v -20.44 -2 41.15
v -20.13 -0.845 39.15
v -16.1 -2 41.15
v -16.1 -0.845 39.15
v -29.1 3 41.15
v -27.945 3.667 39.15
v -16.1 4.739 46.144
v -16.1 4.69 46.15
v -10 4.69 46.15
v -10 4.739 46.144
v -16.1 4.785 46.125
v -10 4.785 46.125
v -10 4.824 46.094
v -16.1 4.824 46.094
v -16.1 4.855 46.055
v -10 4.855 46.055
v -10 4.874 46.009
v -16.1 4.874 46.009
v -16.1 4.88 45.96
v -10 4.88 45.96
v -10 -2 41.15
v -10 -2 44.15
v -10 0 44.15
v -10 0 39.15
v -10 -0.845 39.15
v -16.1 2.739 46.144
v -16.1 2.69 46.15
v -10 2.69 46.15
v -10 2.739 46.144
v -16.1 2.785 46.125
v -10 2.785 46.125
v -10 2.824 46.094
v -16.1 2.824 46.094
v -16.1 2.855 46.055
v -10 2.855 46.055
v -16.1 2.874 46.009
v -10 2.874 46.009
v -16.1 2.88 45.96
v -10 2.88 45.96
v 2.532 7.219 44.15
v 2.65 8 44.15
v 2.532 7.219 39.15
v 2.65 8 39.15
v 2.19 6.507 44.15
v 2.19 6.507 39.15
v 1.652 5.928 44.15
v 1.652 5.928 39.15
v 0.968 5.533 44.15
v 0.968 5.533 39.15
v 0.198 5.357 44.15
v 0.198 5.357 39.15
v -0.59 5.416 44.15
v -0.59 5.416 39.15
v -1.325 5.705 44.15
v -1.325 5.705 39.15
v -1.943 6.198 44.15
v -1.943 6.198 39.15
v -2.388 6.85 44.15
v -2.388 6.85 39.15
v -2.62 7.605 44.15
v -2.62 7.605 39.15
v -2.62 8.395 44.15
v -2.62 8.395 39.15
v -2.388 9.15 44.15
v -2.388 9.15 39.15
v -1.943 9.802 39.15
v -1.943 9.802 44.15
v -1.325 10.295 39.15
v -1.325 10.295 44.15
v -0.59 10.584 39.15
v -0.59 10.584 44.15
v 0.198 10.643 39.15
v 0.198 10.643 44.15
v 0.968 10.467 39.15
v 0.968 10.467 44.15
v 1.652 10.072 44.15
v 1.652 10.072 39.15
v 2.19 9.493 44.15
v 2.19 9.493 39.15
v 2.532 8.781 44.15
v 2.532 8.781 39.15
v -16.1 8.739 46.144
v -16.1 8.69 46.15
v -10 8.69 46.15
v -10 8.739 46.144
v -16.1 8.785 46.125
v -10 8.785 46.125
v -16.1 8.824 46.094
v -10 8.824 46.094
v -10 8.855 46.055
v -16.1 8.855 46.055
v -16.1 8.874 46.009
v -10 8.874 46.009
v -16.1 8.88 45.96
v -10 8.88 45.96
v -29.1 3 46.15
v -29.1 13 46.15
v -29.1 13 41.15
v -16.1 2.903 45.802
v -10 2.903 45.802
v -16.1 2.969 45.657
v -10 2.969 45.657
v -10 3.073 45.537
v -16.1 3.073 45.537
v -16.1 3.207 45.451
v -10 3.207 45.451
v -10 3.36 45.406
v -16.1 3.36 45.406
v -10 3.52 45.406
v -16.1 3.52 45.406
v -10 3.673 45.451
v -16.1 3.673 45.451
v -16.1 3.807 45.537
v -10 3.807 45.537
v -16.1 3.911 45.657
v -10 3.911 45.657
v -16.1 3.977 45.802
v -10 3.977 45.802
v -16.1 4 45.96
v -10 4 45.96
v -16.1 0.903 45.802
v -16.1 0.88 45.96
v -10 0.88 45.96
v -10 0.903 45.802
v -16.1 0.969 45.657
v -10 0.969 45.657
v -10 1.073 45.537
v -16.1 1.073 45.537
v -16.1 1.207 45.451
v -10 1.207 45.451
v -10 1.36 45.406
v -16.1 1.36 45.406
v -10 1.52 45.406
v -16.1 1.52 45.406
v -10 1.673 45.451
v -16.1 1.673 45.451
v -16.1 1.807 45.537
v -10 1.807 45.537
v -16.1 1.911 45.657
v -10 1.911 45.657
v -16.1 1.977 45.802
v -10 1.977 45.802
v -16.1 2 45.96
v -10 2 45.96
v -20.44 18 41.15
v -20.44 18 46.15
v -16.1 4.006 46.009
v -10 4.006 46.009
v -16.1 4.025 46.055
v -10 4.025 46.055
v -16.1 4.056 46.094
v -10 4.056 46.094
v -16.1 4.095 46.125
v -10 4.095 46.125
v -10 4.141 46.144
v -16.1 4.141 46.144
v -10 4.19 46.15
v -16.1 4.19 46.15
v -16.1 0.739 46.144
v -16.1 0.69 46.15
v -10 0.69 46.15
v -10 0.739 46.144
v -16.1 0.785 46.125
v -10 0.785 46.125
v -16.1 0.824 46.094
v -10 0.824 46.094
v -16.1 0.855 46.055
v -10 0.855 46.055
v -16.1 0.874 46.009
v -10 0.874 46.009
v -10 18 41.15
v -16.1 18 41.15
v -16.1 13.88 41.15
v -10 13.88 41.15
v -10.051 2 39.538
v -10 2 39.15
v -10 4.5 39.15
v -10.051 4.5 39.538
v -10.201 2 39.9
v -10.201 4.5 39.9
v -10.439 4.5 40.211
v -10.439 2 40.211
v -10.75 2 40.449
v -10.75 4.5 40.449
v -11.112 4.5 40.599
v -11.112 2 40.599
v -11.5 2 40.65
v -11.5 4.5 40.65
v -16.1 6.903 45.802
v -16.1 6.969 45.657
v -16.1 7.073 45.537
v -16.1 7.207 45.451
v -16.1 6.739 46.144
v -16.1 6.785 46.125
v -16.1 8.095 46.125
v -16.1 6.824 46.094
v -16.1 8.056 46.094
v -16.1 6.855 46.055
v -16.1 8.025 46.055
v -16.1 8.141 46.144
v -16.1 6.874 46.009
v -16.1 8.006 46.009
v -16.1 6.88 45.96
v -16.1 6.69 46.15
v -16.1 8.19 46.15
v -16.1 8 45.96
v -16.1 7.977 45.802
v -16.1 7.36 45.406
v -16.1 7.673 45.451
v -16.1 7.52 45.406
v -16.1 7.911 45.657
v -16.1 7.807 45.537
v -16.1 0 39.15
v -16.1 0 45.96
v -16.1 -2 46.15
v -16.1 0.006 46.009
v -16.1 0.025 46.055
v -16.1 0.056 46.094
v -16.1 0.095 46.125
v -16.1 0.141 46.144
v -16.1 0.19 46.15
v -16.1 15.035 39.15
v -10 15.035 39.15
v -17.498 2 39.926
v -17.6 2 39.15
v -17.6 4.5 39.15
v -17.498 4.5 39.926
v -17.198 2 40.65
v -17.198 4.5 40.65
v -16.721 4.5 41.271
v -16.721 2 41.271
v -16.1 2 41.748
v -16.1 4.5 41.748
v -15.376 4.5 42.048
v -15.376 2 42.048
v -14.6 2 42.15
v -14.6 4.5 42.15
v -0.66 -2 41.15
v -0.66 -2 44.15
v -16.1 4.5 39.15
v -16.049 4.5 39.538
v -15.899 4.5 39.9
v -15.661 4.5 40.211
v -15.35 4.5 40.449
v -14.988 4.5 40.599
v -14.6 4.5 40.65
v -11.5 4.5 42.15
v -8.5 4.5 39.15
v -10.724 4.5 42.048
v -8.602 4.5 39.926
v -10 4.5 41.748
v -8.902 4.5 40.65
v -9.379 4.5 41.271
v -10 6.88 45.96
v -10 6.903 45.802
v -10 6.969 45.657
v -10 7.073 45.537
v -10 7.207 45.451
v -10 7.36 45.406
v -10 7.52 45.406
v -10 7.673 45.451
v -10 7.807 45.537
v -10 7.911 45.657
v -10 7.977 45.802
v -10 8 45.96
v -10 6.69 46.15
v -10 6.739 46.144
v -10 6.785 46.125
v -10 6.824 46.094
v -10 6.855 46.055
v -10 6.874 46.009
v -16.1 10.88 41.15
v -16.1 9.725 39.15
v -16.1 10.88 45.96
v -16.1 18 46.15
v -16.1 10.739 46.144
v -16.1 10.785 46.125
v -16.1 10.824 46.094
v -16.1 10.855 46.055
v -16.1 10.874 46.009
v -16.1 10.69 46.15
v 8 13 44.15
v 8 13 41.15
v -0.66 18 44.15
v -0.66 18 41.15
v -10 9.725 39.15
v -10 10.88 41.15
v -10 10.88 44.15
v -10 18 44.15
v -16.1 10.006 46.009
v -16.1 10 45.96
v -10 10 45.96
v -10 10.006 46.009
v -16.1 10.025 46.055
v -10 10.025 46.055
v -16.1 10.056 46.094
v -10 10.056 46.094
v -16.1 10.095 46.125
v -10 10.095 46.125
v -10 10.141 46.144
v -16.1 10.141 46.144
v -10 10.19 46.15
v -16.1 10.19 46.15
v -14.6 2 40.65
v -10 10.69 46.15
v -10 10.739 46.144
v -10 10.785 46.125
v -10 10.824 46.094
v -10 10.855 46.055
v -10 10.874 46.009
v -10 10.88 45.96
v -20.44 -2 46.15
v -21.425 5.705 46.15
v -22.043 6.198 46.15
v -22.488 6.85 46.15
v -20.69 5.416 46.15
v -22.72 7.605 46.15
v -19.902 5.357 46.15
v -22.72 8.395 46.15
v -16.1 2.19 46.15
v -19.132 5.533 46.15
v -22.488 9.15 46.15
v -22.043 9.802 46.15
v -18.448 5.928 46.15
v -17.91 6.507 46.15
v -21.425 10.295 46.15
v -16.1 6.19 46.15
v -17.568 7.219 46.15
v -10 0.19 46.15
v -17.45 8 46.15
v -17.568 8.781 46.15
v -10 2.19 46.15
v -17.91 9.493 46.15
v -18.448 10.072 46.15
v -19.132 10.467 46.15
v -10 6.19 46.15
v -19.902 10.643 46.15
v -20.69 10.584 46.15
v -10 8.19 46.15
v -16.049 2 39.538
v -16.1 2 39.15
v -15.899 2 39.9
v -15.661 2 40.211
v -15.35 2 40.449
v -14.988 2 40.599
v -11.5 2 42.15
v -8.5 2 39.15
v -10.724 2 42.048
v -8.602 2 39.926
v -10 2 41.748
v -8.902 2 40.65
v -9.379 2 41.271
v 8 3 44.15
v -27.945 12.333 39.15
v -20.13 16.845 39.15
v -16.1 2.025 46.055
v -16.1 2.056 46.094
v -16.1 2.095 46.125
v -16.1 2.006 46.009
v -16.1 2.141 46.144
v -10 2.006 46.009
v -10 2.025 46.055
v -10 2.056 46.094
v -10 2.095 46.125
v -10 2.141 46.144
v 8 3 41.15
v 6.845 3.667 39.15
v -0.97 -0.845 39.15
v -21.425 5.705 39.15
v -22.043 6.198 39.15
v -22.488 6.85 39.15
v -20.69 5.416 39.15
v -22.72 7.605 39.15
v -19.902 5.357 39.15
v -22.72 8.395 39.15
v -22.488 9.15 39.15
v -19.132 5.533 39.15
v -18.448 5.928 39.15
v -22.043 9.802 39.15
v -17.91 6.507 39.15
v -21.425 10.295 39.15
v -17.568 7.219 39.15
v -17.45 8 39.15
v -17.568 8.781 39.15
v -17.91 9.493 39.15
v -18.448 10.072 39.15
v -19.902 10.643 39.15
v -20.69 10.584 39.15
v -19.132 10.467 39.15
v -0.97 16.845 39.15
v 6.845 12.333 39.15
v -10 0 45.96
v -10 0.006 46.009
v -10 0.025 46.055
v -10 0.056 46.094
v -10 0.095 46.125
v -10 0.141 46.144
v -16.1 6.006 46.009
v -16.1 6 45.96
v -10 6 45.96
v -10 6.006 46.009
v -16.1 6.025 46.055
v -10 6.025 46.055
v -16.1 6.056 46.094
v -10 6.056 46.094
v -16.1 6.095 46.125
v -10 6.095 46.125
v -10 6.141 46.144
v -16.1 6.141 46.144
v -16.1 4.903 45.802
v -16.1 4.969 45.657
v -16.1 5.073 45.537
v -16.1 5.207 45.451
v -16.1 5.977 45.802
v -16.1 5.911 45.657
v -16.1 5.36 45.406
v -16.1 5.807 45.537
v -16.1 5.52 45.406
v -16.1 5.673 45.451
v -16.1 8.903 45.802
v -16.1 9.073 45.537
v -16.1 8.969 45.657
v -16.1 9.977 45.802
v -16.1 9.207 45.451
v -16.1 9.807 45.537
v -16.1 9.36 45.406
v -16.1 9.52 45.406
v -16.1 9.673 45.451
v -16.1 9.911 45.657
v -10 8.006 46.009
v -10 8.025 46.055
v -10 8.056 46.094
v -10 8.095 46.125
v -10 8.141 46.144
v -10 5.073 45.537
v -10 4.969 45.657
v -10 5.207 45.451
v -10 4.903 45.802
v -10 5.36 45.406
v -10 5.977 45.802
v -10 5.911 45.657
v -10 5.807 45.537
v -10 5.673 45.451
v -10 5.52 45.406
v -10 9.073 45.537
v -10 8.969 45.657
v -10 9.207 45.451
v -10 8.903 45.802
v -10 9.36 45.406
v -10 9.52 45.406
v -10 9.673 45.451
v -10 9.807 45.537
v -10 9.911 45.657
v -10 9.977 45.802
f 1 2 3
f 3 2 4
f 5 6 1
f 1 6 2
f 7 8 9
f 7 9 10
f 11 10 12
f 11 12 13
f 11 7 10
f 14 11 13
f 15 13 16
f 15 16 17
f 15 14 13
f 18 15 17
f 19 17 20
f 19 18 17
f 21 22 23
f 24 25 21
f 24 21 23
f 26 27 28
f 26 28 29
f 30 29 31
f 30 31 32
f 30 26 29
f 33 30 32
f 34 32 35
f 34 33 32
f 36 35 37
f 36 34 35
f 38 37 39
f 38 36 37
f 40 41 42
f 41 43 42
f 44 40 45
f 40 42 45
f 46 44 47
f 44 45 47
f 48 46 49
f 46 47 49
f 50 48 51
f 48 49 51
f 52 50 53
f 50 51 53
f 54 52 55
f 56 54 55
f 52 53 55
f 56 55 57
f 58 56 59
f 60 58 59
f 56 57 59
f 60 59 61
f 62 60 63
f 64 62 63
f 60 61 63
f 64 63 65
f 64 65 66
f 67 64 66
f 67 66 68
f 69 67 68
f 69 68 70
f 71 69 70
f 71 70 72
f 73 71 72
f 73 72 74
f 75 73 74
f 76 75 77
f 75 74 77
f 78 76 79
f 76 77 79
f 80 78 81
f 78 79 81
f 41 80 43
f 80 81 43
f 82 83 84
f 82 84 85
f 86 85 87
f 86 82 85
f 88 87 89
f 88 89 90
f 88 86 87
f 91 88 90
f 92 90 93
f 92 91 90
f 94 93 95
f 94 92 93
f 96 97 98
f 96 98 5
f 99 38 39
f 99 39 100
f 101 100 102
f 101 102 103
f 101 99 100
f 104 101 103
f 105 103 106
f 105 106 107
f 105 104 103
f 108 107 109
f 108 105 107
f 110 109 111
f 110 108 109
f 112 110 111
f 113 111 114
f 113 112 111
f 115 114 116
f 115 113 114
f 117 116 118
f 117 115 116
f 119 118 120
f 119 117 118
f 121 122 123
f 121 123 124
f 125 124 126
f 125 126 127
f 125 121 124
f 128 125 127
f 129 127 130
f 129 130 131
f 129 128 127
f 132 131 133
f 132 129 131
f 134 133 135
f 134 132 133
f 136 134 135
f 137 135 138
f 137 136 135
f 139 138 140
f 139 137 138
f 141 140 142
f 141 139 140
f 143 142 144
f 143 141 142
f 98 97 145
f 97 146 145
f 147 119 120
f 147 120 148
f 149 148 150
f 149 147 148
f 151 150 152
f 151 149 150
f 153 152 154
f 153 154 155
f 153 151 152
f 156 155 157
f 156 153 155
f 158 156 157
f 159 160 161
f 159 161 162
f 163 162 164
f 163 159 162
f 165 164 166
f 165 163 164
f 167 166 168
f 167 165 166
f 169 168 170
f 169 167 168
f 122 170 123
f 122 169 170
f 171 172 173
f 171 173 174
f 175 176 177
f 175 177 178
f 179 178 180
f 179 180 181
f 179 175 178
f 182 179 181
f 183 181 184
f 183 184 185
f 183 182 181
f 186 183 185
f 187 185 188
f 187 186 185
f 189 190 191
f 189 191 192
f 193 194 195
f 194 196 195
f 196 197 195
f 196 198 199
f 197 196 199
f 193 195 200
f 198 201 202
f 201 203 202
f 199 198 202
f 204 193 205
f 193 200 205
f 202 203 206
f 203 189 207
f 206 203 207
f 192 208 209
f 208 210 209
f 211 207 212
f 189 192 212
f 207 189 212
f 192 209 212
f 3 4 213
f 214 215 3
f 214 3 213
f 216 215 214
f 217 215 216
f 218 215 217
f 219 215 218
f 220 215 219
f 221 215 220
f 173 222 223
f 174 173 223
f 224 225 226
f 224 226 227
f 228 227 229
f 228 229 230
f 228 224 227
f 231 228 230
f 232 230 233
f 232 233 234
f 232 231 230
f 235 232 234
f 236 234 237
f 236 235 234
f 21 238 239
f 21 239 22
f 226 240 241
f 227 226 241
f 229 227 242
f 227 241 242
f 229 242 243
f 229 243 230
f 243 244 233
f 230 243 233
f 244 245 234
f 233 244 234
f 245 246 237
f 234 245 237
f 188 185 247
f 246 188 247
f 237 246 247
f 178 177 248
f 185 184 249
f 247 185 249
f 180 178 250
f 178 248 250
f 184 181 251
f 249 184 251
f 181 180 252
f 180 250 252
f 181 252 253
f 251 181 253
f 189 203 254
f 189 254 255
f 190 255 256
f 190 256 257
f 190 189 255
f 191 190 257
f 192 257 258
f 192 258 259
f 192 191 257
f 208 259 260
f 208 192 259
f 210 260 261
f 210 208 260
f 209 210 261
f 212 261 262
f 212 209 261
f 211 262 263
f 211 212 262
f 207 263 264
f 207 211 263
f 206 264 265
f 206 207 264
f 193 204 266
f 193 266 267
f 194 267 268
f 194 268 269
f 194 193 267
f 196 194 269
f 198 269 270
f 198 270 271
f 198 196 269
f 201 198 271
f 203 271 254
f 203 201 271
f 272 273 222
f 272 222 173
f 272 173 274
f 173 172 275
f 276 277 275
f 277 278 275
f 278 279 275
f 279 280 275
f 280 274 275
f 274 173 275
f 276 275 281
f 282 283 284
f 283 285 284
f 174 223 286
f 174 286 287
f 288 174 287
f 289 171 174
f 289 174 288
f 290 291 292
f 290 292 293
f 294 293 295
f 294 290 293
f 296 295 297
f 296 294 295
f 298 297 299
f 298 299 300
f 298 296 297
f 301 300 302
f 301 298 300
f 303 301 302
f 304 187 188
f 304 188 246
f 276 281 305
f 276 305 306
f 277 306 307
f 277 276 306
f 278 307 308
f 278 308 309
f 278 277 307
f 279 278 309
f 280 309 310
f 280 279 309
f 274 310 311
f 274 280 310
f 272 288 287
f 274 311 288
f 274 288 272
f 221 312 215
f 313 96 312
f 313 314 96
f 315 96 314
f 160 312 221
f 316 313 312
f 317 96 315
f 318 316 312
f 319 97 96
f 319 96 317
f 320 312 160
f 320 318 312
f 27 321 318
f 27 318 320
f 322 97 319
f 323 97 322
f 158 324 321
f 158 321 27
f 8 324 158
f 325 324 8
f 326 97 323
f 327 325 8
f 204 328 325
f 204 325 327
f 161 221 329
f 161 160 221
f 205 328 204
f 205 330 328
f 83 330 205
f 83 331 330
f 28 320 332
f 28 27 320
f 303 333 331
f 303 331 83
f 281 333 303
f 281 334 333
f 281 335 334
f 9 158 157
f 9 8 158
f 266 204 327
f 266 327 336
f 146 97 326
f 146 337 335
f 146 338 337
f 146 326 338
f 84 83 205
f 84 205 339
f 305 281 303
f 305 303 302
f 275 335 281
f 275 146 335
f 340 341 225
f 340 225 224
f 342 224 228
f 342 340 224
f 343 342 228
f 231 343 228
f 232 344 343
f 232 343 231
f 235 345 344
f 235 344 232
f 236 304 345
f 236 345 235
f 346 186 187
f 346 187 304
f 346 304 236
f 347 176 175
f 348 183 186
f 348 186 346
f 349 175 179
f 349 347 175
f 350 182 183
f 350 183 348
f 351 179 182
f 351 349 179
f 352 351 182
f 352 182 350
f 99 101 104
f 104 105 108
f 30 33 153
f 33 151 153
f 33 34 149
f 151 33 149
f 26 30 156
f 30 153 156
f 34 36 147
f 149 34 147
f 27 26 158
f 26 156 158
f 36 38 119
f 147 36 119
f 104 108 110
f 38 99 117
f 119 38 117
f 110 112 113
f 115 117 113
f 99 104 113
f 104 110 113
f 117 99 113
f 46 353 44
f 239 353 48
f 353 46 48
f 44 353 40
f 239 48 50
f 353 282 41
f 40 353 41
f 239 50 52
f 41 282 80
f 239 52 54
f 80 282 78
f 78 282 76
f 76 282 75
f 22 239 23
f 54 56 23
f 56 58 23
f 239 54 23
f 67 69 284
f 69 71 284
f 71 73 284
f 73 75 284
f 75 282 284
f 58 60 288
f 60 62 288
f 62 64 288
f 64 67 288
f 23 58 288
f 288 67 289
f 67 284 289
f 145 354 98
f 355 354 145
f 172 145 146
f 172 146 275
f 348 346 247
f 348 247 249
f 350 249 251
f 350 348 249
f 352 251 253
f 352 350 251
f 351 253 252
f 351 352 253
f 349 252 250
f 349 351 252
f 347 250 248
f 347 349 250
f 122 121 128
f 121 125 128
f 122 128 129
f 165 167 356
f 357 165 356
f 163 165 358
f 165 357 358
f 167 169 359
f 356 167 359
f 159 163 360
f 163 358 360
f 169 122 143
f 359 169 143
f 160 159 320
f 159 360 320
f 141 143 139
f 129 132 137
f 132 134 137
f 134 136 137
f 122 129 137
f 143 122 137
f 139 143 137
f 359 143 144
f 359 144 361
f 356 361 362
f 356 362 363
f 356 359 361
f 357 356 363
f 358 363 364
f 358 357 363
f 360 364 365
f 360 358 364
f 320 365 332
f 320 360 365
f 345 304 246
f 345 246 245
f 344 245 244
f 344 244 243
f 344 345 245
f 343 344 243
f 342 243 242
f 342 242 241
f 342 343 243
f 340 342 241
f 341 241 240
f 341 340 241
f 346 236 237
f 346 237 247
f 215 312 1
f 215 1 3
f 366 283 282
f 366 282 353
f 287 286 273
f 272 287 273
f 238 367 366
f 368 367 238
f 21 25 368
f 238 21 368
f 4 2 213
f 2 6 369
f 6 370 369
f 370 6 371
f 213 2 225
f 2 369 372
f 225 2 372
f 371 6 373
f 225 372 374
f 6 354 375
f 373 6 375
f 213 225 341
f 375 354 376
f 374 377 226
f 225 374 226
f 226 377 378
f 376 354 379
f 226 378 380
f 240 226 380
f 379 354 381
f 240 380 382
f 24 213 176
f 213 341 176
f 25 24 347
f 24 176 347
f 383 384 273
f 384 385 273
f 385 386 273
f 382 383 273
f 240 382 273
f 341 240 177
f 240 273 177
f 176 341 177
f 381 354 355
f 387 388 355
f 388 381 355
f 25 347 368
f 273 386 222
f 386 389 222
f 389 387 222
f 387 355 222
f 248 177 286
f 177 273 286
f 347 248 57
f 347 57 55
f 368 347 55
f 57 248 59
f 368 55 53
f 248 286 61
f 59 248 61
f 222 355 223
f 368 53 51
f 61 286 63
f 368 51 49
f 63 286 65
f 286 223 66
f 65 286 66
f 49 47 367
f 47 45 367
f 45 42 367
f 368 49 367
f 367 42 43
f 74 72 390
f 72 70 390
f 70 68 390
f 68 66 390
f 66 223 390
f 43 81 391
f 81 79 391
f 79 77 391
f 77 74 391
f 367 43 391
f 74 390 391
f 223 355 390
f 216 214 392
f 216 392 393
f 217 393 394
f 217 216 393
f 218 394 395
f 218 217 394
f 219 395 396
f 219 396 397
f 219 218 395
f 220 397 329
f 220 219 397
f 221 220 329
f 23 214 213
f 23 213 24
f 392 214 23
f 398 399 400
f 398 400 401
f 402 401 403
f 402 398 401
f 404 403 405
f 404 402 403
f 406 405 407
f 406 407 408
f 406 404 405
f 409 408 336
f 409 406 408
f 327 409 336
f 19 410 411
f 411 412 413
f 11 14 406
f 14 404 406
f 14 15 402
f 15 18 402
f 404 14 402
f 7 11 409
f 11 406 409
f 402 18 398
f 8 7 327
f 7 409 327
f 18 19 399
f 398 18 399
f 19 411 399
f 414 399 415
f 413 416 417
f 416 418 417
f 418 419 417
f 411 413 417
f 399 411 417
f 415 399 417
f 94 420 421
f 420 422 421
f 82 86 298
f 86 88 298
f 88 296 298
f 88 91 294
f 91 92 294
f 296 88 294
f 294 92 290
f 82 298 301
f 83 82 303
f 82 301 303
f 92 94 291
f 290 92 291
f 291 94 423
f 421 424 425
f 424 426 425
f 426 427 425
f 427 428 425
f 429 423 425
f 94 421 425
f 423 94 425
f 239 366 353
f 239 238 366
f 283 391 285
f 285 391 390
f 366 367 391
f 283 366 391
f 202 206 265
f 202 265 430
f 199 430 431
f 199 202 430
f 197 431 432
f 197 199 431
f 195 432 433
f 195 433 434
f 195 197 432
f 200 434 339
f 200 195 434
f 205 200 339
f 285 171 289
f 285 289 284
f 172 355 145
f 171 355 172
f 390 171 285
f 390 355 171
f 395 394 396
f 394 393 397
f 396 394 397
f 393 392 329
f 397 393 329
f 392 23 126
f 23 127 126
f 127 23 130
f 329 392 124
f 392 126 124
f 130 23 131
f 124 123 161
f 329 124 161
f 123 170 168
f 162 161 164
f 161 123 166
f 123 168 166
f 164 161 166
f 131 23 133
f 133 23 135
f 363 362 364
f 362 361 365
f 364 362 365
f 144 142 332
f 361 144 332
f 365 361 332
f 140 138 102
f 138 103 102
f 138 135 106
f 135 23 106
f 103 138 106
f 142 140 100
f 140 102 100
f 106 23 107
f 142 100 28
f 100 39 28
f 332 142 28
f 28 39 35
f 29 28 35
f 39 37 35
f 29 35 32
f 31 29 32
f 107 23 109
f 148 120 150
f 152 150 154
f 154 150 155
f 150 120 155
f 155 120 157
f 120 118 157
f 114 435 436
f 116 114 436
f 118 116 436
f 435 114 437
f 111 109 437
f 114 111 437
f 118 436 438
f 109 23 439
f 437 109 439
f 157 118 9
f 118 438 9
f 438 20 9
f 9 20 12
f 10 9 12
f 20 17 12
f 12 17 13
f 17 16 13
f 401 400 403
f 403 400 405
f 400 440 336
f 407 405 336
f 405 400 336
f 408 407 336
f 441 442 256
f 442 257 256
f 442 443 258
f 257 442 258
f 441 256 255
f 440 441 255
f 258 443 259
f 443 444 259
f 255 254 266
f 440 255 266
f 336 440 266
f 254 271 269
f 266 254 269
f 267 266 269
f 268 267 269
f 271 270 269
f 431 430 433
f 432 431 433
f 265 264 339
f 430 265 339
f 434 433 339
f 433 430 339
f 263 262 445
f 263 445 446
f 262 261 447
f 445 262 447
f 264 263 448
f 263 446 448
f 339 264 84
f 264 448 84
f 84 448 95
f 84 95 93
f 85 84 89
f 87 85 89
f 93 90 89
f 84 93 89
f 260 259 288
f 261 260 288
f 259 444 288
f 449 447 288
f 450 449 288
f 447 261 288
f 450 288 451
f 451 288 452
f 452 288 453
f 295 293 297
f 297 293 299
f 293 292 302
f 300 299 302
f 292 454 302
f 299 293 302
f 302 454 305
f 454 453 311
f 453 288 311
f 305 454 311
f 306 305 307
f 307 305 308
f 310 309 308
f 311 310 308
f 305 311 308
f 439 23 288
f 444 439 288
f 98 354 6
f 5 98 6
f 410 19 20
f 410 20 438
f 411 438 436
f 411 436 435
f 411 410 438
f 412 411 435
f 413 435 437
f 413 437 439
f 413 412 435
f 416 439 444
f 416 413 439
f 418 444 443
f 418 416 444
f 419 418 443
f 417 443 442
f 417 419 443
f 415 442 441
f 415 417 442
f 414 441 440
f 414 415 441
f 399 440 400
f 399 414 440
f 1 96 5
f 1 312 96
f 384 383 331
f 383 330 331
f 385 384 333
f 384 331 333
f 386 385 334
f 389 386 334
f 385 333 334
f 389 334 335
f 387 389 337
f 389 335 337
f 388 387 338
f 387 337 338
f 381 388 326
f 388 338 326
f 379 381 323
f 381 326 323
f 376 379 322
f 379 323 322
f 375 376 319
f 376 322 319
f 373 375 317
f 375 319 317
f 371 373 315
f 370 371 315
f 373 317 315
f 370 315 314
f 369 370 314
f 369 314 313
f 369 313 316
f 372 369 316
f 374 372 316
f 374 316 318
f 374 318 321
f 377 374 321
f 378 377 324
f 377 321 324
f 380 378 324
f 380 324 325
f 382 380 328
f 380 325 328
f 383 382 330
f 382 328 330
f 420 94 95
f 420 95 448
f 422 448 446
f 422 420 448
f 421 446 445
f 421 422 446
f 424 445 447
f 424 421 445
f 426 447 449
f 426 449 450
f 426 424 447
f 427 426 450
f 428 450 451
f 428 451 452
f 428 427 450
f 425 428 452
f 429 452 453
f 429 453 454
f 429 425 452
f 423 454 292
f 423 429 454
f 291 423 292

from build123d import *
from OCP.BRepFilletAPI import BRepFilletAPI_MakeChamfer

# Parameters (mm, degrees)
AUFSATZ_LINEAR_AUSTRAGEN1_DEPTH    = 6.1
AUFSATZ_LINEAR_AUSTRAGEN1_2_DEPTH  = 6.1
SKIZZE2_W                          = 6
SKIZZE2_H                          = 10.88
SCHNITT_LINEAR_AUSTRAGEN1_DEPTH    = 6.1
SKIZZE3_R                          = 2.65
SKIZZE3_W                          = 6.1
SKIZZE3_H                          = 4.12
AUFSATZ_LINEAR_AUSTRAGEN2_DEPTH    = 2.19
SKIZZE4_R                          = 2.65
AUFSATZ_LINEAR_AUSTRAGEN3_DEPTH    = 4.81
SKIZZE5_R                          = 2.65
AUFSATZ_LINEAR_AUSTRAGEN4_DEPTH    = 0.19
FASE1_SIZE                         = 5
FASE1_SIZE2                        = 8.660254038
FASE2_SIZE                         = 2
FASE2_SIZE2                        = 1.154700538
SCHNITT_LINEAR_START               = -4
SCHNITT_LINEAR_AUSTRAGEN3_DEPTH    = 2.5
SCHNITT_LINEAR_AUSTRAGEN4_REACH    = 67.9
SKIZZE12_W                         = 5
SKIZZE12_H                         = 6.1
K_RPER_VERSCHIEBEN_KOPIEREN1_ANGLE = 90


with BuildPart() as part:
    # Skizze1 → Aufsatz-Linear austragen1 (new body)
    with BuildSketch(Plane.XY):
        Polygon((0, 0), (0, 9.44), (0, 10.88), (-6, 10.88), (-6, 0), align=None)
    extrude(amount=AUFSATZ_LINEAR_AUSTRAGEN1_DEPTH)

    # Skizze2 → Schnitt-Linear austragen1 (cut)
    with BuildSketch(Plane.XY.offset(6.1)):
        with Locations((-3, 5.44)):
            Rectangle(SKIZZE2_W, SKIZZE2_H)
    extrude(amount=-SCHNITT_LINEAR_AUSTRAGEN1_DEPTH, mode=Mode.SUBTRACT)


with BuildPart() as body_2:
    # Skizze1 → Aufsatz-Linear austragen1 2 (new body)
    with BuildSketch(Plane.XY):
        with BuildLine():
            Line((-7.05, 10.19), (-7.05, 10.69))
            ThreePointArc((-7.05, 10.69), (-7.105649712, 10.824350288), (-7.24, 10.88))
            Line((-7.24, 10.88), (-9.24, 10.88))
            Line((-9.24, 10.88), (-9.24, 0))
            Line((-9.24, 0), (-7.24, 0))
            ThreePointArc((-7.24, 0), (-7.105649712, 0.055649712), (-7.05, 0.19))
            Line((-7.05, 0.19), (-7.05, 0.69))
            ThreePointArc((-7.05, 0.69), (-7.105649712, 0.824350288), (-7.24, 0.88))
            ThreePointArc((-7.24, 0.88), (-7.8, 1.44), (-7.24, 2))
            ThreePointArc((-7.24, 2), (-7.105649712, 2.055649712), (-7.05, 2.19))
            Line((-7.05, 2.19), (-7.05, 2.69))
            ThreePointArc((-7.05, 2.69), (-7.105649712, 2.824350288), (-7.24, 2.88))
            ThreePointArc((-7.24, 2.88), (-7.8, 3.44), (-7.24, 4))
            ThreePointArc((-7.24, 4), (-7.105649712, 4.055649712), (-7.05, 4.19))
            Line((-7.05, 4.19), (-7.05, 4.69))
            ThreePointArc((-7.05, 4.69), (-7.105649712, 4.824350288), (-7.24, 4.88))
            ThreePointArc((-7.24, 4.88), (-7.8, 5.44), (-7.24, 6))
            ThreePointArc((-7.24, 6), (-7.105649712, 6.055649712), (-7.05, 6.19))
            Line((-7.05, 6.19), (-7.05, 6.69))
            ThreePointArc((-7.05, 6.69), (-7.105649712, 6.824350288), (-7.24, 6.88))
            ThreePointArc((-7.24, 6.88), (-7.8, 7.44), (-7.24, 8))
            ThreePointArc((-7.24, 8), (-7.105649712, 8.055649712), (-7.05, 8.19))
            Line((-7.05, 8.19), (-7.05, 8.69))
            ThreePointArc((-7.05, 8.69), (-7.105649712, 8.824350288), (-7.24, 8.88))
            ThreePointArc((-7.24, 8.88), (-7.8, 9.44), (-7.24, 10))
            ThreePointArc((-7.24, 10), (-7.105649712, 10.055649712), (-7.05, 10.19))
        make_face()
    extrude(amount=AUFSATZ_LINEAR_AUSTRAGEN1_2_DEPTH)

    # Skizze3 → Aufsatz-Linear austragen2 (add)
    # profile 1 of 2: a face of its own
    with BuildSketch(Plane.ZY.offset(9.24)):
        Polygon((-13, -2), (0, -2), (0, 13.88), (0, 18), (-13, 18), align=None)
        with Locations((-4, 8)):
            Circle(SKIZZE3_R, mode=Mode.SUBTRACT)
    # profile 2 of 2: a face of its own
    with BuildSketch(Plane.ZY.offset(9.24)):
        with Locations((3.05, 15.94)):
            Rectangle(SKIZZE3_W, SKIZZE3_H)
    extrude(amount=-AUFSATZ_LINEAR_AUSTRAGEN2_DEPTH)

    # Skizze4 → Aufsatz-Linear austragen3 (add)
    # profile 1 of 2: a face of its own
    with BuildSketch(Plane.ZY.offset(9.24)):
        Polygon((24.1, 18), (6.1, 18), (6.1, 13.88), (6.1, 10.88), (6.1, 0), (6.1, -2), (24.1, -2), align=None)
        with Locations((16.1, 8)):
            Circle(SKIZZE4_R, mode=Mode.SUBTRACT)
    # profile 2 of 2: a face of its own
    with BuildSketch(Plane.ZY.offset(9.24)):
        Polygon((6.1, 0), (6.1, 10.88), (0, 10.88), (0, 13.88), (6.1, 13.88), (6.1, 18), (-13, 18), (-13, -2), (0, -2), (0, 0), align=None)
        with Locations((-4, 8)):
            Circle(SKIZZE4_R, mode=Mode.SUBTRACT)
    extrude(amount=AUFSATZ_LINEAR_AUSTRAGEN3_DEPTH)

    # Skizze5 → Aufsatz-Linear austragen4 (add)
    with BuildSketch(Plane(origin=(-9.24, 0, 0), x_dir=(0, 0, -1), z_dir=(1, 0, 0))):
        Polygon((-6.1, 13.88), (-6.1, 18), (-24.1, 18), (-24.1, -2), (-6.1, -2), (-6.1, 0), (-6.1, 10.88), align=None)
        with Locations(Location((-16.1, 8, 0), (0, 0, 180))):
            Circle(SKIZZE5_R, mode=Mode.SUBTRACT)
    extrude(amount=AUFSATZ_LINEAR_AUSTRAGEN4_DEPTH)

    # Fase1: one chamfer whose edges measure the first distance from different faces: ONE call of the kernel's chamfer builder (chamfer() names one face for all edges)
    fase1_edges_1 = [body_2.edges().sort_by_distance(p)[0] for p in [
        (-11.645, -2, 24.1),
        (-11.645, 18, 24.1),
    ]]
    fase1_side_1 = [body_2.faces().sort_by_distance(p)[0] for p in [
        (-11.645, 8, 24.1),
    ]]
    fase1_edges_2 = [body_2.edges().sort_by_distance(p)[0] for p in [
        (-10.55, -2, -13),
        (-10.55, 18, -13),
    ]]
    fase1_side_2 = [body_2.faces().sort_by_distance(p)[0] for p in [
        (-10.55, 8, -13),
    ]]
    fase1 = BRepFilletAPI_MakeChamfer(body_2.part.solid().wrapped)
    for e in fase1_edges_1:
        fase1.Add(FASE1_SIZE, FASE1_SIZE2, e.wrapped, fase1_side_1[0].wrapped)  # the first distance lies on this face
    for e in fase1_edges_2:
        fase1.Add(FASE1_SIZE, FASE1_SIZE2, e.wrapped, fase1_side_2[0].wrapped)  # the first distance lies on this face
    add(Compound.cast(fase1.Shape()), mode=Mode.REPLACE)

    # Fase2: one chamfer whose edges measure the first distance from different faces: ONE call of the kernel's chamfer builder (chamfer() names one face for all edges)
    fase2_edges_1 = [body_2.edges().sort_by_distance(p)[0] for p in [
        (-14.05, -2, 10.769872981),
    ]]
    fase2_side_1 = [body_2.faces().sort_by_distance(p)[0] for p in [
        (-11.645, -2, 10.769872981),
    ]]
    fase2_edges_2 = [body_2.edges().sort_by_distance(p)[0] for p in [
        (-14.05, 10.88, 3.05),
    ]]
    fase2_side_2 = [body_2.faces().sort_by_distance(p)[0] for p in [
        (-11.645, 10.88, 3.05),
    ]]
    fase2_edges_3 = [body_2.edges().sort_by_distance(p)[0] for p in [
        (-14.05, 13.88, 3.05),
    ]]
    fase2_side_3 = [body_2.faces().sort_by_distance(p)[0] for p in [
        (-10.55, 13.88, 3.05),
    ]]
    fase2_edges_4 = [body_2.edges().sort_by_distance(p)[0] for p in [
        (-14.05, 18, 5.55),
    ]]
    fase2_side_4 = [body_2.faces().sort_by_distance(p)[0] for p in [
        (-10.939880768, 18, 4.735948766),
    ]]
    fase2_edges_5 = [body_2.edges().sort_by_distance(p)[0] for p in [
        (-14.05, 8, 24.1),
    ]]
    fase2_side_5 = [body_2.faces().sort_by_distance(p)[0] for p in [
        (-11.645, 8, 24.1),
    ]]
    fase2_edges_6 = [body_2.edges().sort_by_distance(p)[0] for p in [
        (-14.05, 8, -13),
    ]]
    fase2_side_6 = [body_2.faces().sort_by_distance(p)[0] for p in [
        (-10.55, 8, -13),
    ]]
    fase2_edges_7 = [body_2.edges().sort_by_distance(p)[0] for p in [
        (-14.05, -2, -2.169872981),
    ]]
    fase2_side_7 = [body_2.faces().sort_by_distance(p)[0] for p in [
        (-10.55, -2, -2.169872981),
    ]]
    fase2_edges_8 = [body_2.edges().sort_by_distance(p)[0] for p in [
        (-14.05, 0.5, -8.669872981),
    ]]
    fase2_side_8 = [body_2.faces().sort_by_distance(p)[0] for p in [
        (-10.55, 0.5, -8.669872981),
    ]]
    fase2_edges_9 = [body_2.edges().sort_by_distance(p)[0] for p in [
        (-14.05, 0.5, 19.769872981),
    ]]
    fase2_side_9 = [body_2.faces().sort_by_distance(p)[0] for p in [
        (-11.645, 0.5, 19.769872981),
    ]]
    fase2_edges_10 = [body_2.edges().sort_by_distance(p)[0] for p in [
        (-14.05, 15.5, 19.769872981),
    ]]
    fase2_side_10 = [body_2.faces().sort_by_distance(p)[0] for p in [
        (-11.645, 15.5, 19.769872981),
    ]]
    fase2_edges_11 = [body_2.edges().sort_by_distance(p)[0] for p in [
        (-14.05, 15.5, -8.669872981),
    ]]
    fase2_side_11 = [body_2.faces().sort_by_distance(p)[0] for p in [
        (-10.55, 15.5, -8.669872981),
    ]]
    fase2 = BRepFilletAPI_MakeChamfer(body_2.part.solid().wrapped)
    for e in fase2_edges_1:
        fase2.Add(FASE2_SIZE, FASE2_SIZE2, e.wrapped, fase2_side_1[0].wrapped)  # the first distance lies on this face
    for e in fase2_edges_2:
        fase2.Add(FASE2_SIZE, FASE2_SIZE2, e.wrapped, fase2_side_2[0].wrapped)  # the first distance lies on this face
    for e in fase2_edges_3:
        fase2.Add(FASE2_SIZE, FASE2_SIZE2, e.wrapped, fase2_side_3[0].wrapped)  # the first distance lies on this face
    for e in fase2_edges_4:
        fase2.Add(FASE2_SIZE, FASE2_SIZE2, e.wrapped, fase2_side_4[0].wrapped)  # the first distance lies on this face
    for e in fase2_edges_5:
        fase2.Add(FASE2_SIZE, FASE2_SIZE2, e.wrapped, fase2_side_5[0].wrapped)  # the first distance lies on this face
    for e in fase2_edges_6:
        fase2.Add(FASE2_SIZE, FASE2_SIZE2, e.wrapped, fase2_side_6[0].wrapped)  # the first distance lies on this face
    for e in fase2_edges_7:
        fase2.Add(FASE2_SIZE, FASE2_SIZE2, e.wrapped, fase2_side_7[0].wrapped)  # the first distance lies on this face
    for e in fase2_edges_8:
        fase2.Add(FASE2_SIZE, FASE2_SIZE2, e.wrapped, fase2_side_8[0].wrapped)  # the first distance lies on this face
    for e in fase2_edges_9:
        fase2.Add(FASE2_SIZE, FASE2_SIZE2, e.wrapped, fase2_side_9[0].wrapped)  # the first distance lies on this face
    for e in fase2_edges_10:
        fase2.Add(FASE2_SIZE, FASE2_SIZE2, e.wrapped, fase2_side_10[0].wrapped)  # the first distance lies on this face
    for e in fase2_edges_11:
        fase2.Add(FASE2_SIZE, FASE2_SIZE2, e.wrapped, fase2_side_11[0].wrapped)  # the first distance lies on this face
    add(Compound.cast(fase2.Shape()), mode=Mode.REPLACE)

    # Skizze11 → Schnitt-Linear austragen3 (cut)
    with BuildSketch(Plane.XZ.offset(2).offset(SCHNITT_LINEAR_START)):
        with BuildLine():
            Line((-14.05, 7.6), (-14.05, 6.1))
            ThreePointArc((-14.05, 6.1), (-12.989339828, 5.660660172), (-12.55, 4.6))
            Line((-12.55, 4.6), (-12.55, 1.5))
            ThreePointArc((-12.55, 1.5), (-12.989339828, 0.439339828), (-14.05, 0))
            Line((-14.05, 0), (-14.05, -1.5))
            ThreePointArc((-14.05, -1.5), (-11.928679656, -0.621320344), (-11.05, 1.5))
            Line((-11.05, 1.5), (-11.05, 4.6))
            ThreePointArc((-11.05, 4.6), (-11.928679656, 6.721320344), (-14.05, 7.6))
        make_face()
    extrude(amount=-SCHNITT_LINEAR_AUSTRAGEN3_DEPTH, mode=Mode.SUBTRACT)


with BuildPart() as body_2_2:
    # Spiegeln1: mirrored copy
    add(body_2.part.mirror(Plane(origin=(-63.197479165, -24.924466517, 24.1), x_dir=(1, 0, 0), z_dir=(0, 0, 1))))

    # Schnitt-Linear austragen4: up to this plane
    schnitt_linear_austragen4_end = Plane(origin=(-14.05, 15.034700538, 42.1), z_dir=(0.4999999999999981, 0.8660254037844397, 0))
    # Skizze12 → Schnitt-Linear austragen4 (cut, up to the surface)
    with BuildSketch(Plane(origin=(0, 18, 0), x_dir=(1, 0, 0), z_dir=(0, 1, 0)), mode=Mode.PRIVATE) as schnitt_linear_austragen4_sk1:
        with Locations((-9.55, -45.15)):
            Rectangle(SKIZZE12_W, SKIZZE12_H)
    schnitt_linear_austragen4_tool1 = split(extrude(schnitt_linear_austragen4_sk1.sketch, amount=-SCHNITT_LINEAR_AUSTRAGEN4_REACH, mode=Mode.PRIVATE), bisect_by=schnitt_linear_austragen4_end, keep=Keep.BOTH, mode=Mode.PRIVATE)
    add(schnitt_linear_austragen4_tool1.solids().sort_by_distance((-9.55, 18, 45.15))[0], mode=Mode.SUBTRACT)


with BuildPart() as body_2_2_1:
    # Körper-Verschieben/Kopieren1: moved
    add(body_2_2.part.rotate(Axis((-10.55, 0, 42.65), (0, -1, 0)), K_RPER_VERSCHIEBEN_KOPIEREN1_ANGLE))


solid = body_2_2_1.part
